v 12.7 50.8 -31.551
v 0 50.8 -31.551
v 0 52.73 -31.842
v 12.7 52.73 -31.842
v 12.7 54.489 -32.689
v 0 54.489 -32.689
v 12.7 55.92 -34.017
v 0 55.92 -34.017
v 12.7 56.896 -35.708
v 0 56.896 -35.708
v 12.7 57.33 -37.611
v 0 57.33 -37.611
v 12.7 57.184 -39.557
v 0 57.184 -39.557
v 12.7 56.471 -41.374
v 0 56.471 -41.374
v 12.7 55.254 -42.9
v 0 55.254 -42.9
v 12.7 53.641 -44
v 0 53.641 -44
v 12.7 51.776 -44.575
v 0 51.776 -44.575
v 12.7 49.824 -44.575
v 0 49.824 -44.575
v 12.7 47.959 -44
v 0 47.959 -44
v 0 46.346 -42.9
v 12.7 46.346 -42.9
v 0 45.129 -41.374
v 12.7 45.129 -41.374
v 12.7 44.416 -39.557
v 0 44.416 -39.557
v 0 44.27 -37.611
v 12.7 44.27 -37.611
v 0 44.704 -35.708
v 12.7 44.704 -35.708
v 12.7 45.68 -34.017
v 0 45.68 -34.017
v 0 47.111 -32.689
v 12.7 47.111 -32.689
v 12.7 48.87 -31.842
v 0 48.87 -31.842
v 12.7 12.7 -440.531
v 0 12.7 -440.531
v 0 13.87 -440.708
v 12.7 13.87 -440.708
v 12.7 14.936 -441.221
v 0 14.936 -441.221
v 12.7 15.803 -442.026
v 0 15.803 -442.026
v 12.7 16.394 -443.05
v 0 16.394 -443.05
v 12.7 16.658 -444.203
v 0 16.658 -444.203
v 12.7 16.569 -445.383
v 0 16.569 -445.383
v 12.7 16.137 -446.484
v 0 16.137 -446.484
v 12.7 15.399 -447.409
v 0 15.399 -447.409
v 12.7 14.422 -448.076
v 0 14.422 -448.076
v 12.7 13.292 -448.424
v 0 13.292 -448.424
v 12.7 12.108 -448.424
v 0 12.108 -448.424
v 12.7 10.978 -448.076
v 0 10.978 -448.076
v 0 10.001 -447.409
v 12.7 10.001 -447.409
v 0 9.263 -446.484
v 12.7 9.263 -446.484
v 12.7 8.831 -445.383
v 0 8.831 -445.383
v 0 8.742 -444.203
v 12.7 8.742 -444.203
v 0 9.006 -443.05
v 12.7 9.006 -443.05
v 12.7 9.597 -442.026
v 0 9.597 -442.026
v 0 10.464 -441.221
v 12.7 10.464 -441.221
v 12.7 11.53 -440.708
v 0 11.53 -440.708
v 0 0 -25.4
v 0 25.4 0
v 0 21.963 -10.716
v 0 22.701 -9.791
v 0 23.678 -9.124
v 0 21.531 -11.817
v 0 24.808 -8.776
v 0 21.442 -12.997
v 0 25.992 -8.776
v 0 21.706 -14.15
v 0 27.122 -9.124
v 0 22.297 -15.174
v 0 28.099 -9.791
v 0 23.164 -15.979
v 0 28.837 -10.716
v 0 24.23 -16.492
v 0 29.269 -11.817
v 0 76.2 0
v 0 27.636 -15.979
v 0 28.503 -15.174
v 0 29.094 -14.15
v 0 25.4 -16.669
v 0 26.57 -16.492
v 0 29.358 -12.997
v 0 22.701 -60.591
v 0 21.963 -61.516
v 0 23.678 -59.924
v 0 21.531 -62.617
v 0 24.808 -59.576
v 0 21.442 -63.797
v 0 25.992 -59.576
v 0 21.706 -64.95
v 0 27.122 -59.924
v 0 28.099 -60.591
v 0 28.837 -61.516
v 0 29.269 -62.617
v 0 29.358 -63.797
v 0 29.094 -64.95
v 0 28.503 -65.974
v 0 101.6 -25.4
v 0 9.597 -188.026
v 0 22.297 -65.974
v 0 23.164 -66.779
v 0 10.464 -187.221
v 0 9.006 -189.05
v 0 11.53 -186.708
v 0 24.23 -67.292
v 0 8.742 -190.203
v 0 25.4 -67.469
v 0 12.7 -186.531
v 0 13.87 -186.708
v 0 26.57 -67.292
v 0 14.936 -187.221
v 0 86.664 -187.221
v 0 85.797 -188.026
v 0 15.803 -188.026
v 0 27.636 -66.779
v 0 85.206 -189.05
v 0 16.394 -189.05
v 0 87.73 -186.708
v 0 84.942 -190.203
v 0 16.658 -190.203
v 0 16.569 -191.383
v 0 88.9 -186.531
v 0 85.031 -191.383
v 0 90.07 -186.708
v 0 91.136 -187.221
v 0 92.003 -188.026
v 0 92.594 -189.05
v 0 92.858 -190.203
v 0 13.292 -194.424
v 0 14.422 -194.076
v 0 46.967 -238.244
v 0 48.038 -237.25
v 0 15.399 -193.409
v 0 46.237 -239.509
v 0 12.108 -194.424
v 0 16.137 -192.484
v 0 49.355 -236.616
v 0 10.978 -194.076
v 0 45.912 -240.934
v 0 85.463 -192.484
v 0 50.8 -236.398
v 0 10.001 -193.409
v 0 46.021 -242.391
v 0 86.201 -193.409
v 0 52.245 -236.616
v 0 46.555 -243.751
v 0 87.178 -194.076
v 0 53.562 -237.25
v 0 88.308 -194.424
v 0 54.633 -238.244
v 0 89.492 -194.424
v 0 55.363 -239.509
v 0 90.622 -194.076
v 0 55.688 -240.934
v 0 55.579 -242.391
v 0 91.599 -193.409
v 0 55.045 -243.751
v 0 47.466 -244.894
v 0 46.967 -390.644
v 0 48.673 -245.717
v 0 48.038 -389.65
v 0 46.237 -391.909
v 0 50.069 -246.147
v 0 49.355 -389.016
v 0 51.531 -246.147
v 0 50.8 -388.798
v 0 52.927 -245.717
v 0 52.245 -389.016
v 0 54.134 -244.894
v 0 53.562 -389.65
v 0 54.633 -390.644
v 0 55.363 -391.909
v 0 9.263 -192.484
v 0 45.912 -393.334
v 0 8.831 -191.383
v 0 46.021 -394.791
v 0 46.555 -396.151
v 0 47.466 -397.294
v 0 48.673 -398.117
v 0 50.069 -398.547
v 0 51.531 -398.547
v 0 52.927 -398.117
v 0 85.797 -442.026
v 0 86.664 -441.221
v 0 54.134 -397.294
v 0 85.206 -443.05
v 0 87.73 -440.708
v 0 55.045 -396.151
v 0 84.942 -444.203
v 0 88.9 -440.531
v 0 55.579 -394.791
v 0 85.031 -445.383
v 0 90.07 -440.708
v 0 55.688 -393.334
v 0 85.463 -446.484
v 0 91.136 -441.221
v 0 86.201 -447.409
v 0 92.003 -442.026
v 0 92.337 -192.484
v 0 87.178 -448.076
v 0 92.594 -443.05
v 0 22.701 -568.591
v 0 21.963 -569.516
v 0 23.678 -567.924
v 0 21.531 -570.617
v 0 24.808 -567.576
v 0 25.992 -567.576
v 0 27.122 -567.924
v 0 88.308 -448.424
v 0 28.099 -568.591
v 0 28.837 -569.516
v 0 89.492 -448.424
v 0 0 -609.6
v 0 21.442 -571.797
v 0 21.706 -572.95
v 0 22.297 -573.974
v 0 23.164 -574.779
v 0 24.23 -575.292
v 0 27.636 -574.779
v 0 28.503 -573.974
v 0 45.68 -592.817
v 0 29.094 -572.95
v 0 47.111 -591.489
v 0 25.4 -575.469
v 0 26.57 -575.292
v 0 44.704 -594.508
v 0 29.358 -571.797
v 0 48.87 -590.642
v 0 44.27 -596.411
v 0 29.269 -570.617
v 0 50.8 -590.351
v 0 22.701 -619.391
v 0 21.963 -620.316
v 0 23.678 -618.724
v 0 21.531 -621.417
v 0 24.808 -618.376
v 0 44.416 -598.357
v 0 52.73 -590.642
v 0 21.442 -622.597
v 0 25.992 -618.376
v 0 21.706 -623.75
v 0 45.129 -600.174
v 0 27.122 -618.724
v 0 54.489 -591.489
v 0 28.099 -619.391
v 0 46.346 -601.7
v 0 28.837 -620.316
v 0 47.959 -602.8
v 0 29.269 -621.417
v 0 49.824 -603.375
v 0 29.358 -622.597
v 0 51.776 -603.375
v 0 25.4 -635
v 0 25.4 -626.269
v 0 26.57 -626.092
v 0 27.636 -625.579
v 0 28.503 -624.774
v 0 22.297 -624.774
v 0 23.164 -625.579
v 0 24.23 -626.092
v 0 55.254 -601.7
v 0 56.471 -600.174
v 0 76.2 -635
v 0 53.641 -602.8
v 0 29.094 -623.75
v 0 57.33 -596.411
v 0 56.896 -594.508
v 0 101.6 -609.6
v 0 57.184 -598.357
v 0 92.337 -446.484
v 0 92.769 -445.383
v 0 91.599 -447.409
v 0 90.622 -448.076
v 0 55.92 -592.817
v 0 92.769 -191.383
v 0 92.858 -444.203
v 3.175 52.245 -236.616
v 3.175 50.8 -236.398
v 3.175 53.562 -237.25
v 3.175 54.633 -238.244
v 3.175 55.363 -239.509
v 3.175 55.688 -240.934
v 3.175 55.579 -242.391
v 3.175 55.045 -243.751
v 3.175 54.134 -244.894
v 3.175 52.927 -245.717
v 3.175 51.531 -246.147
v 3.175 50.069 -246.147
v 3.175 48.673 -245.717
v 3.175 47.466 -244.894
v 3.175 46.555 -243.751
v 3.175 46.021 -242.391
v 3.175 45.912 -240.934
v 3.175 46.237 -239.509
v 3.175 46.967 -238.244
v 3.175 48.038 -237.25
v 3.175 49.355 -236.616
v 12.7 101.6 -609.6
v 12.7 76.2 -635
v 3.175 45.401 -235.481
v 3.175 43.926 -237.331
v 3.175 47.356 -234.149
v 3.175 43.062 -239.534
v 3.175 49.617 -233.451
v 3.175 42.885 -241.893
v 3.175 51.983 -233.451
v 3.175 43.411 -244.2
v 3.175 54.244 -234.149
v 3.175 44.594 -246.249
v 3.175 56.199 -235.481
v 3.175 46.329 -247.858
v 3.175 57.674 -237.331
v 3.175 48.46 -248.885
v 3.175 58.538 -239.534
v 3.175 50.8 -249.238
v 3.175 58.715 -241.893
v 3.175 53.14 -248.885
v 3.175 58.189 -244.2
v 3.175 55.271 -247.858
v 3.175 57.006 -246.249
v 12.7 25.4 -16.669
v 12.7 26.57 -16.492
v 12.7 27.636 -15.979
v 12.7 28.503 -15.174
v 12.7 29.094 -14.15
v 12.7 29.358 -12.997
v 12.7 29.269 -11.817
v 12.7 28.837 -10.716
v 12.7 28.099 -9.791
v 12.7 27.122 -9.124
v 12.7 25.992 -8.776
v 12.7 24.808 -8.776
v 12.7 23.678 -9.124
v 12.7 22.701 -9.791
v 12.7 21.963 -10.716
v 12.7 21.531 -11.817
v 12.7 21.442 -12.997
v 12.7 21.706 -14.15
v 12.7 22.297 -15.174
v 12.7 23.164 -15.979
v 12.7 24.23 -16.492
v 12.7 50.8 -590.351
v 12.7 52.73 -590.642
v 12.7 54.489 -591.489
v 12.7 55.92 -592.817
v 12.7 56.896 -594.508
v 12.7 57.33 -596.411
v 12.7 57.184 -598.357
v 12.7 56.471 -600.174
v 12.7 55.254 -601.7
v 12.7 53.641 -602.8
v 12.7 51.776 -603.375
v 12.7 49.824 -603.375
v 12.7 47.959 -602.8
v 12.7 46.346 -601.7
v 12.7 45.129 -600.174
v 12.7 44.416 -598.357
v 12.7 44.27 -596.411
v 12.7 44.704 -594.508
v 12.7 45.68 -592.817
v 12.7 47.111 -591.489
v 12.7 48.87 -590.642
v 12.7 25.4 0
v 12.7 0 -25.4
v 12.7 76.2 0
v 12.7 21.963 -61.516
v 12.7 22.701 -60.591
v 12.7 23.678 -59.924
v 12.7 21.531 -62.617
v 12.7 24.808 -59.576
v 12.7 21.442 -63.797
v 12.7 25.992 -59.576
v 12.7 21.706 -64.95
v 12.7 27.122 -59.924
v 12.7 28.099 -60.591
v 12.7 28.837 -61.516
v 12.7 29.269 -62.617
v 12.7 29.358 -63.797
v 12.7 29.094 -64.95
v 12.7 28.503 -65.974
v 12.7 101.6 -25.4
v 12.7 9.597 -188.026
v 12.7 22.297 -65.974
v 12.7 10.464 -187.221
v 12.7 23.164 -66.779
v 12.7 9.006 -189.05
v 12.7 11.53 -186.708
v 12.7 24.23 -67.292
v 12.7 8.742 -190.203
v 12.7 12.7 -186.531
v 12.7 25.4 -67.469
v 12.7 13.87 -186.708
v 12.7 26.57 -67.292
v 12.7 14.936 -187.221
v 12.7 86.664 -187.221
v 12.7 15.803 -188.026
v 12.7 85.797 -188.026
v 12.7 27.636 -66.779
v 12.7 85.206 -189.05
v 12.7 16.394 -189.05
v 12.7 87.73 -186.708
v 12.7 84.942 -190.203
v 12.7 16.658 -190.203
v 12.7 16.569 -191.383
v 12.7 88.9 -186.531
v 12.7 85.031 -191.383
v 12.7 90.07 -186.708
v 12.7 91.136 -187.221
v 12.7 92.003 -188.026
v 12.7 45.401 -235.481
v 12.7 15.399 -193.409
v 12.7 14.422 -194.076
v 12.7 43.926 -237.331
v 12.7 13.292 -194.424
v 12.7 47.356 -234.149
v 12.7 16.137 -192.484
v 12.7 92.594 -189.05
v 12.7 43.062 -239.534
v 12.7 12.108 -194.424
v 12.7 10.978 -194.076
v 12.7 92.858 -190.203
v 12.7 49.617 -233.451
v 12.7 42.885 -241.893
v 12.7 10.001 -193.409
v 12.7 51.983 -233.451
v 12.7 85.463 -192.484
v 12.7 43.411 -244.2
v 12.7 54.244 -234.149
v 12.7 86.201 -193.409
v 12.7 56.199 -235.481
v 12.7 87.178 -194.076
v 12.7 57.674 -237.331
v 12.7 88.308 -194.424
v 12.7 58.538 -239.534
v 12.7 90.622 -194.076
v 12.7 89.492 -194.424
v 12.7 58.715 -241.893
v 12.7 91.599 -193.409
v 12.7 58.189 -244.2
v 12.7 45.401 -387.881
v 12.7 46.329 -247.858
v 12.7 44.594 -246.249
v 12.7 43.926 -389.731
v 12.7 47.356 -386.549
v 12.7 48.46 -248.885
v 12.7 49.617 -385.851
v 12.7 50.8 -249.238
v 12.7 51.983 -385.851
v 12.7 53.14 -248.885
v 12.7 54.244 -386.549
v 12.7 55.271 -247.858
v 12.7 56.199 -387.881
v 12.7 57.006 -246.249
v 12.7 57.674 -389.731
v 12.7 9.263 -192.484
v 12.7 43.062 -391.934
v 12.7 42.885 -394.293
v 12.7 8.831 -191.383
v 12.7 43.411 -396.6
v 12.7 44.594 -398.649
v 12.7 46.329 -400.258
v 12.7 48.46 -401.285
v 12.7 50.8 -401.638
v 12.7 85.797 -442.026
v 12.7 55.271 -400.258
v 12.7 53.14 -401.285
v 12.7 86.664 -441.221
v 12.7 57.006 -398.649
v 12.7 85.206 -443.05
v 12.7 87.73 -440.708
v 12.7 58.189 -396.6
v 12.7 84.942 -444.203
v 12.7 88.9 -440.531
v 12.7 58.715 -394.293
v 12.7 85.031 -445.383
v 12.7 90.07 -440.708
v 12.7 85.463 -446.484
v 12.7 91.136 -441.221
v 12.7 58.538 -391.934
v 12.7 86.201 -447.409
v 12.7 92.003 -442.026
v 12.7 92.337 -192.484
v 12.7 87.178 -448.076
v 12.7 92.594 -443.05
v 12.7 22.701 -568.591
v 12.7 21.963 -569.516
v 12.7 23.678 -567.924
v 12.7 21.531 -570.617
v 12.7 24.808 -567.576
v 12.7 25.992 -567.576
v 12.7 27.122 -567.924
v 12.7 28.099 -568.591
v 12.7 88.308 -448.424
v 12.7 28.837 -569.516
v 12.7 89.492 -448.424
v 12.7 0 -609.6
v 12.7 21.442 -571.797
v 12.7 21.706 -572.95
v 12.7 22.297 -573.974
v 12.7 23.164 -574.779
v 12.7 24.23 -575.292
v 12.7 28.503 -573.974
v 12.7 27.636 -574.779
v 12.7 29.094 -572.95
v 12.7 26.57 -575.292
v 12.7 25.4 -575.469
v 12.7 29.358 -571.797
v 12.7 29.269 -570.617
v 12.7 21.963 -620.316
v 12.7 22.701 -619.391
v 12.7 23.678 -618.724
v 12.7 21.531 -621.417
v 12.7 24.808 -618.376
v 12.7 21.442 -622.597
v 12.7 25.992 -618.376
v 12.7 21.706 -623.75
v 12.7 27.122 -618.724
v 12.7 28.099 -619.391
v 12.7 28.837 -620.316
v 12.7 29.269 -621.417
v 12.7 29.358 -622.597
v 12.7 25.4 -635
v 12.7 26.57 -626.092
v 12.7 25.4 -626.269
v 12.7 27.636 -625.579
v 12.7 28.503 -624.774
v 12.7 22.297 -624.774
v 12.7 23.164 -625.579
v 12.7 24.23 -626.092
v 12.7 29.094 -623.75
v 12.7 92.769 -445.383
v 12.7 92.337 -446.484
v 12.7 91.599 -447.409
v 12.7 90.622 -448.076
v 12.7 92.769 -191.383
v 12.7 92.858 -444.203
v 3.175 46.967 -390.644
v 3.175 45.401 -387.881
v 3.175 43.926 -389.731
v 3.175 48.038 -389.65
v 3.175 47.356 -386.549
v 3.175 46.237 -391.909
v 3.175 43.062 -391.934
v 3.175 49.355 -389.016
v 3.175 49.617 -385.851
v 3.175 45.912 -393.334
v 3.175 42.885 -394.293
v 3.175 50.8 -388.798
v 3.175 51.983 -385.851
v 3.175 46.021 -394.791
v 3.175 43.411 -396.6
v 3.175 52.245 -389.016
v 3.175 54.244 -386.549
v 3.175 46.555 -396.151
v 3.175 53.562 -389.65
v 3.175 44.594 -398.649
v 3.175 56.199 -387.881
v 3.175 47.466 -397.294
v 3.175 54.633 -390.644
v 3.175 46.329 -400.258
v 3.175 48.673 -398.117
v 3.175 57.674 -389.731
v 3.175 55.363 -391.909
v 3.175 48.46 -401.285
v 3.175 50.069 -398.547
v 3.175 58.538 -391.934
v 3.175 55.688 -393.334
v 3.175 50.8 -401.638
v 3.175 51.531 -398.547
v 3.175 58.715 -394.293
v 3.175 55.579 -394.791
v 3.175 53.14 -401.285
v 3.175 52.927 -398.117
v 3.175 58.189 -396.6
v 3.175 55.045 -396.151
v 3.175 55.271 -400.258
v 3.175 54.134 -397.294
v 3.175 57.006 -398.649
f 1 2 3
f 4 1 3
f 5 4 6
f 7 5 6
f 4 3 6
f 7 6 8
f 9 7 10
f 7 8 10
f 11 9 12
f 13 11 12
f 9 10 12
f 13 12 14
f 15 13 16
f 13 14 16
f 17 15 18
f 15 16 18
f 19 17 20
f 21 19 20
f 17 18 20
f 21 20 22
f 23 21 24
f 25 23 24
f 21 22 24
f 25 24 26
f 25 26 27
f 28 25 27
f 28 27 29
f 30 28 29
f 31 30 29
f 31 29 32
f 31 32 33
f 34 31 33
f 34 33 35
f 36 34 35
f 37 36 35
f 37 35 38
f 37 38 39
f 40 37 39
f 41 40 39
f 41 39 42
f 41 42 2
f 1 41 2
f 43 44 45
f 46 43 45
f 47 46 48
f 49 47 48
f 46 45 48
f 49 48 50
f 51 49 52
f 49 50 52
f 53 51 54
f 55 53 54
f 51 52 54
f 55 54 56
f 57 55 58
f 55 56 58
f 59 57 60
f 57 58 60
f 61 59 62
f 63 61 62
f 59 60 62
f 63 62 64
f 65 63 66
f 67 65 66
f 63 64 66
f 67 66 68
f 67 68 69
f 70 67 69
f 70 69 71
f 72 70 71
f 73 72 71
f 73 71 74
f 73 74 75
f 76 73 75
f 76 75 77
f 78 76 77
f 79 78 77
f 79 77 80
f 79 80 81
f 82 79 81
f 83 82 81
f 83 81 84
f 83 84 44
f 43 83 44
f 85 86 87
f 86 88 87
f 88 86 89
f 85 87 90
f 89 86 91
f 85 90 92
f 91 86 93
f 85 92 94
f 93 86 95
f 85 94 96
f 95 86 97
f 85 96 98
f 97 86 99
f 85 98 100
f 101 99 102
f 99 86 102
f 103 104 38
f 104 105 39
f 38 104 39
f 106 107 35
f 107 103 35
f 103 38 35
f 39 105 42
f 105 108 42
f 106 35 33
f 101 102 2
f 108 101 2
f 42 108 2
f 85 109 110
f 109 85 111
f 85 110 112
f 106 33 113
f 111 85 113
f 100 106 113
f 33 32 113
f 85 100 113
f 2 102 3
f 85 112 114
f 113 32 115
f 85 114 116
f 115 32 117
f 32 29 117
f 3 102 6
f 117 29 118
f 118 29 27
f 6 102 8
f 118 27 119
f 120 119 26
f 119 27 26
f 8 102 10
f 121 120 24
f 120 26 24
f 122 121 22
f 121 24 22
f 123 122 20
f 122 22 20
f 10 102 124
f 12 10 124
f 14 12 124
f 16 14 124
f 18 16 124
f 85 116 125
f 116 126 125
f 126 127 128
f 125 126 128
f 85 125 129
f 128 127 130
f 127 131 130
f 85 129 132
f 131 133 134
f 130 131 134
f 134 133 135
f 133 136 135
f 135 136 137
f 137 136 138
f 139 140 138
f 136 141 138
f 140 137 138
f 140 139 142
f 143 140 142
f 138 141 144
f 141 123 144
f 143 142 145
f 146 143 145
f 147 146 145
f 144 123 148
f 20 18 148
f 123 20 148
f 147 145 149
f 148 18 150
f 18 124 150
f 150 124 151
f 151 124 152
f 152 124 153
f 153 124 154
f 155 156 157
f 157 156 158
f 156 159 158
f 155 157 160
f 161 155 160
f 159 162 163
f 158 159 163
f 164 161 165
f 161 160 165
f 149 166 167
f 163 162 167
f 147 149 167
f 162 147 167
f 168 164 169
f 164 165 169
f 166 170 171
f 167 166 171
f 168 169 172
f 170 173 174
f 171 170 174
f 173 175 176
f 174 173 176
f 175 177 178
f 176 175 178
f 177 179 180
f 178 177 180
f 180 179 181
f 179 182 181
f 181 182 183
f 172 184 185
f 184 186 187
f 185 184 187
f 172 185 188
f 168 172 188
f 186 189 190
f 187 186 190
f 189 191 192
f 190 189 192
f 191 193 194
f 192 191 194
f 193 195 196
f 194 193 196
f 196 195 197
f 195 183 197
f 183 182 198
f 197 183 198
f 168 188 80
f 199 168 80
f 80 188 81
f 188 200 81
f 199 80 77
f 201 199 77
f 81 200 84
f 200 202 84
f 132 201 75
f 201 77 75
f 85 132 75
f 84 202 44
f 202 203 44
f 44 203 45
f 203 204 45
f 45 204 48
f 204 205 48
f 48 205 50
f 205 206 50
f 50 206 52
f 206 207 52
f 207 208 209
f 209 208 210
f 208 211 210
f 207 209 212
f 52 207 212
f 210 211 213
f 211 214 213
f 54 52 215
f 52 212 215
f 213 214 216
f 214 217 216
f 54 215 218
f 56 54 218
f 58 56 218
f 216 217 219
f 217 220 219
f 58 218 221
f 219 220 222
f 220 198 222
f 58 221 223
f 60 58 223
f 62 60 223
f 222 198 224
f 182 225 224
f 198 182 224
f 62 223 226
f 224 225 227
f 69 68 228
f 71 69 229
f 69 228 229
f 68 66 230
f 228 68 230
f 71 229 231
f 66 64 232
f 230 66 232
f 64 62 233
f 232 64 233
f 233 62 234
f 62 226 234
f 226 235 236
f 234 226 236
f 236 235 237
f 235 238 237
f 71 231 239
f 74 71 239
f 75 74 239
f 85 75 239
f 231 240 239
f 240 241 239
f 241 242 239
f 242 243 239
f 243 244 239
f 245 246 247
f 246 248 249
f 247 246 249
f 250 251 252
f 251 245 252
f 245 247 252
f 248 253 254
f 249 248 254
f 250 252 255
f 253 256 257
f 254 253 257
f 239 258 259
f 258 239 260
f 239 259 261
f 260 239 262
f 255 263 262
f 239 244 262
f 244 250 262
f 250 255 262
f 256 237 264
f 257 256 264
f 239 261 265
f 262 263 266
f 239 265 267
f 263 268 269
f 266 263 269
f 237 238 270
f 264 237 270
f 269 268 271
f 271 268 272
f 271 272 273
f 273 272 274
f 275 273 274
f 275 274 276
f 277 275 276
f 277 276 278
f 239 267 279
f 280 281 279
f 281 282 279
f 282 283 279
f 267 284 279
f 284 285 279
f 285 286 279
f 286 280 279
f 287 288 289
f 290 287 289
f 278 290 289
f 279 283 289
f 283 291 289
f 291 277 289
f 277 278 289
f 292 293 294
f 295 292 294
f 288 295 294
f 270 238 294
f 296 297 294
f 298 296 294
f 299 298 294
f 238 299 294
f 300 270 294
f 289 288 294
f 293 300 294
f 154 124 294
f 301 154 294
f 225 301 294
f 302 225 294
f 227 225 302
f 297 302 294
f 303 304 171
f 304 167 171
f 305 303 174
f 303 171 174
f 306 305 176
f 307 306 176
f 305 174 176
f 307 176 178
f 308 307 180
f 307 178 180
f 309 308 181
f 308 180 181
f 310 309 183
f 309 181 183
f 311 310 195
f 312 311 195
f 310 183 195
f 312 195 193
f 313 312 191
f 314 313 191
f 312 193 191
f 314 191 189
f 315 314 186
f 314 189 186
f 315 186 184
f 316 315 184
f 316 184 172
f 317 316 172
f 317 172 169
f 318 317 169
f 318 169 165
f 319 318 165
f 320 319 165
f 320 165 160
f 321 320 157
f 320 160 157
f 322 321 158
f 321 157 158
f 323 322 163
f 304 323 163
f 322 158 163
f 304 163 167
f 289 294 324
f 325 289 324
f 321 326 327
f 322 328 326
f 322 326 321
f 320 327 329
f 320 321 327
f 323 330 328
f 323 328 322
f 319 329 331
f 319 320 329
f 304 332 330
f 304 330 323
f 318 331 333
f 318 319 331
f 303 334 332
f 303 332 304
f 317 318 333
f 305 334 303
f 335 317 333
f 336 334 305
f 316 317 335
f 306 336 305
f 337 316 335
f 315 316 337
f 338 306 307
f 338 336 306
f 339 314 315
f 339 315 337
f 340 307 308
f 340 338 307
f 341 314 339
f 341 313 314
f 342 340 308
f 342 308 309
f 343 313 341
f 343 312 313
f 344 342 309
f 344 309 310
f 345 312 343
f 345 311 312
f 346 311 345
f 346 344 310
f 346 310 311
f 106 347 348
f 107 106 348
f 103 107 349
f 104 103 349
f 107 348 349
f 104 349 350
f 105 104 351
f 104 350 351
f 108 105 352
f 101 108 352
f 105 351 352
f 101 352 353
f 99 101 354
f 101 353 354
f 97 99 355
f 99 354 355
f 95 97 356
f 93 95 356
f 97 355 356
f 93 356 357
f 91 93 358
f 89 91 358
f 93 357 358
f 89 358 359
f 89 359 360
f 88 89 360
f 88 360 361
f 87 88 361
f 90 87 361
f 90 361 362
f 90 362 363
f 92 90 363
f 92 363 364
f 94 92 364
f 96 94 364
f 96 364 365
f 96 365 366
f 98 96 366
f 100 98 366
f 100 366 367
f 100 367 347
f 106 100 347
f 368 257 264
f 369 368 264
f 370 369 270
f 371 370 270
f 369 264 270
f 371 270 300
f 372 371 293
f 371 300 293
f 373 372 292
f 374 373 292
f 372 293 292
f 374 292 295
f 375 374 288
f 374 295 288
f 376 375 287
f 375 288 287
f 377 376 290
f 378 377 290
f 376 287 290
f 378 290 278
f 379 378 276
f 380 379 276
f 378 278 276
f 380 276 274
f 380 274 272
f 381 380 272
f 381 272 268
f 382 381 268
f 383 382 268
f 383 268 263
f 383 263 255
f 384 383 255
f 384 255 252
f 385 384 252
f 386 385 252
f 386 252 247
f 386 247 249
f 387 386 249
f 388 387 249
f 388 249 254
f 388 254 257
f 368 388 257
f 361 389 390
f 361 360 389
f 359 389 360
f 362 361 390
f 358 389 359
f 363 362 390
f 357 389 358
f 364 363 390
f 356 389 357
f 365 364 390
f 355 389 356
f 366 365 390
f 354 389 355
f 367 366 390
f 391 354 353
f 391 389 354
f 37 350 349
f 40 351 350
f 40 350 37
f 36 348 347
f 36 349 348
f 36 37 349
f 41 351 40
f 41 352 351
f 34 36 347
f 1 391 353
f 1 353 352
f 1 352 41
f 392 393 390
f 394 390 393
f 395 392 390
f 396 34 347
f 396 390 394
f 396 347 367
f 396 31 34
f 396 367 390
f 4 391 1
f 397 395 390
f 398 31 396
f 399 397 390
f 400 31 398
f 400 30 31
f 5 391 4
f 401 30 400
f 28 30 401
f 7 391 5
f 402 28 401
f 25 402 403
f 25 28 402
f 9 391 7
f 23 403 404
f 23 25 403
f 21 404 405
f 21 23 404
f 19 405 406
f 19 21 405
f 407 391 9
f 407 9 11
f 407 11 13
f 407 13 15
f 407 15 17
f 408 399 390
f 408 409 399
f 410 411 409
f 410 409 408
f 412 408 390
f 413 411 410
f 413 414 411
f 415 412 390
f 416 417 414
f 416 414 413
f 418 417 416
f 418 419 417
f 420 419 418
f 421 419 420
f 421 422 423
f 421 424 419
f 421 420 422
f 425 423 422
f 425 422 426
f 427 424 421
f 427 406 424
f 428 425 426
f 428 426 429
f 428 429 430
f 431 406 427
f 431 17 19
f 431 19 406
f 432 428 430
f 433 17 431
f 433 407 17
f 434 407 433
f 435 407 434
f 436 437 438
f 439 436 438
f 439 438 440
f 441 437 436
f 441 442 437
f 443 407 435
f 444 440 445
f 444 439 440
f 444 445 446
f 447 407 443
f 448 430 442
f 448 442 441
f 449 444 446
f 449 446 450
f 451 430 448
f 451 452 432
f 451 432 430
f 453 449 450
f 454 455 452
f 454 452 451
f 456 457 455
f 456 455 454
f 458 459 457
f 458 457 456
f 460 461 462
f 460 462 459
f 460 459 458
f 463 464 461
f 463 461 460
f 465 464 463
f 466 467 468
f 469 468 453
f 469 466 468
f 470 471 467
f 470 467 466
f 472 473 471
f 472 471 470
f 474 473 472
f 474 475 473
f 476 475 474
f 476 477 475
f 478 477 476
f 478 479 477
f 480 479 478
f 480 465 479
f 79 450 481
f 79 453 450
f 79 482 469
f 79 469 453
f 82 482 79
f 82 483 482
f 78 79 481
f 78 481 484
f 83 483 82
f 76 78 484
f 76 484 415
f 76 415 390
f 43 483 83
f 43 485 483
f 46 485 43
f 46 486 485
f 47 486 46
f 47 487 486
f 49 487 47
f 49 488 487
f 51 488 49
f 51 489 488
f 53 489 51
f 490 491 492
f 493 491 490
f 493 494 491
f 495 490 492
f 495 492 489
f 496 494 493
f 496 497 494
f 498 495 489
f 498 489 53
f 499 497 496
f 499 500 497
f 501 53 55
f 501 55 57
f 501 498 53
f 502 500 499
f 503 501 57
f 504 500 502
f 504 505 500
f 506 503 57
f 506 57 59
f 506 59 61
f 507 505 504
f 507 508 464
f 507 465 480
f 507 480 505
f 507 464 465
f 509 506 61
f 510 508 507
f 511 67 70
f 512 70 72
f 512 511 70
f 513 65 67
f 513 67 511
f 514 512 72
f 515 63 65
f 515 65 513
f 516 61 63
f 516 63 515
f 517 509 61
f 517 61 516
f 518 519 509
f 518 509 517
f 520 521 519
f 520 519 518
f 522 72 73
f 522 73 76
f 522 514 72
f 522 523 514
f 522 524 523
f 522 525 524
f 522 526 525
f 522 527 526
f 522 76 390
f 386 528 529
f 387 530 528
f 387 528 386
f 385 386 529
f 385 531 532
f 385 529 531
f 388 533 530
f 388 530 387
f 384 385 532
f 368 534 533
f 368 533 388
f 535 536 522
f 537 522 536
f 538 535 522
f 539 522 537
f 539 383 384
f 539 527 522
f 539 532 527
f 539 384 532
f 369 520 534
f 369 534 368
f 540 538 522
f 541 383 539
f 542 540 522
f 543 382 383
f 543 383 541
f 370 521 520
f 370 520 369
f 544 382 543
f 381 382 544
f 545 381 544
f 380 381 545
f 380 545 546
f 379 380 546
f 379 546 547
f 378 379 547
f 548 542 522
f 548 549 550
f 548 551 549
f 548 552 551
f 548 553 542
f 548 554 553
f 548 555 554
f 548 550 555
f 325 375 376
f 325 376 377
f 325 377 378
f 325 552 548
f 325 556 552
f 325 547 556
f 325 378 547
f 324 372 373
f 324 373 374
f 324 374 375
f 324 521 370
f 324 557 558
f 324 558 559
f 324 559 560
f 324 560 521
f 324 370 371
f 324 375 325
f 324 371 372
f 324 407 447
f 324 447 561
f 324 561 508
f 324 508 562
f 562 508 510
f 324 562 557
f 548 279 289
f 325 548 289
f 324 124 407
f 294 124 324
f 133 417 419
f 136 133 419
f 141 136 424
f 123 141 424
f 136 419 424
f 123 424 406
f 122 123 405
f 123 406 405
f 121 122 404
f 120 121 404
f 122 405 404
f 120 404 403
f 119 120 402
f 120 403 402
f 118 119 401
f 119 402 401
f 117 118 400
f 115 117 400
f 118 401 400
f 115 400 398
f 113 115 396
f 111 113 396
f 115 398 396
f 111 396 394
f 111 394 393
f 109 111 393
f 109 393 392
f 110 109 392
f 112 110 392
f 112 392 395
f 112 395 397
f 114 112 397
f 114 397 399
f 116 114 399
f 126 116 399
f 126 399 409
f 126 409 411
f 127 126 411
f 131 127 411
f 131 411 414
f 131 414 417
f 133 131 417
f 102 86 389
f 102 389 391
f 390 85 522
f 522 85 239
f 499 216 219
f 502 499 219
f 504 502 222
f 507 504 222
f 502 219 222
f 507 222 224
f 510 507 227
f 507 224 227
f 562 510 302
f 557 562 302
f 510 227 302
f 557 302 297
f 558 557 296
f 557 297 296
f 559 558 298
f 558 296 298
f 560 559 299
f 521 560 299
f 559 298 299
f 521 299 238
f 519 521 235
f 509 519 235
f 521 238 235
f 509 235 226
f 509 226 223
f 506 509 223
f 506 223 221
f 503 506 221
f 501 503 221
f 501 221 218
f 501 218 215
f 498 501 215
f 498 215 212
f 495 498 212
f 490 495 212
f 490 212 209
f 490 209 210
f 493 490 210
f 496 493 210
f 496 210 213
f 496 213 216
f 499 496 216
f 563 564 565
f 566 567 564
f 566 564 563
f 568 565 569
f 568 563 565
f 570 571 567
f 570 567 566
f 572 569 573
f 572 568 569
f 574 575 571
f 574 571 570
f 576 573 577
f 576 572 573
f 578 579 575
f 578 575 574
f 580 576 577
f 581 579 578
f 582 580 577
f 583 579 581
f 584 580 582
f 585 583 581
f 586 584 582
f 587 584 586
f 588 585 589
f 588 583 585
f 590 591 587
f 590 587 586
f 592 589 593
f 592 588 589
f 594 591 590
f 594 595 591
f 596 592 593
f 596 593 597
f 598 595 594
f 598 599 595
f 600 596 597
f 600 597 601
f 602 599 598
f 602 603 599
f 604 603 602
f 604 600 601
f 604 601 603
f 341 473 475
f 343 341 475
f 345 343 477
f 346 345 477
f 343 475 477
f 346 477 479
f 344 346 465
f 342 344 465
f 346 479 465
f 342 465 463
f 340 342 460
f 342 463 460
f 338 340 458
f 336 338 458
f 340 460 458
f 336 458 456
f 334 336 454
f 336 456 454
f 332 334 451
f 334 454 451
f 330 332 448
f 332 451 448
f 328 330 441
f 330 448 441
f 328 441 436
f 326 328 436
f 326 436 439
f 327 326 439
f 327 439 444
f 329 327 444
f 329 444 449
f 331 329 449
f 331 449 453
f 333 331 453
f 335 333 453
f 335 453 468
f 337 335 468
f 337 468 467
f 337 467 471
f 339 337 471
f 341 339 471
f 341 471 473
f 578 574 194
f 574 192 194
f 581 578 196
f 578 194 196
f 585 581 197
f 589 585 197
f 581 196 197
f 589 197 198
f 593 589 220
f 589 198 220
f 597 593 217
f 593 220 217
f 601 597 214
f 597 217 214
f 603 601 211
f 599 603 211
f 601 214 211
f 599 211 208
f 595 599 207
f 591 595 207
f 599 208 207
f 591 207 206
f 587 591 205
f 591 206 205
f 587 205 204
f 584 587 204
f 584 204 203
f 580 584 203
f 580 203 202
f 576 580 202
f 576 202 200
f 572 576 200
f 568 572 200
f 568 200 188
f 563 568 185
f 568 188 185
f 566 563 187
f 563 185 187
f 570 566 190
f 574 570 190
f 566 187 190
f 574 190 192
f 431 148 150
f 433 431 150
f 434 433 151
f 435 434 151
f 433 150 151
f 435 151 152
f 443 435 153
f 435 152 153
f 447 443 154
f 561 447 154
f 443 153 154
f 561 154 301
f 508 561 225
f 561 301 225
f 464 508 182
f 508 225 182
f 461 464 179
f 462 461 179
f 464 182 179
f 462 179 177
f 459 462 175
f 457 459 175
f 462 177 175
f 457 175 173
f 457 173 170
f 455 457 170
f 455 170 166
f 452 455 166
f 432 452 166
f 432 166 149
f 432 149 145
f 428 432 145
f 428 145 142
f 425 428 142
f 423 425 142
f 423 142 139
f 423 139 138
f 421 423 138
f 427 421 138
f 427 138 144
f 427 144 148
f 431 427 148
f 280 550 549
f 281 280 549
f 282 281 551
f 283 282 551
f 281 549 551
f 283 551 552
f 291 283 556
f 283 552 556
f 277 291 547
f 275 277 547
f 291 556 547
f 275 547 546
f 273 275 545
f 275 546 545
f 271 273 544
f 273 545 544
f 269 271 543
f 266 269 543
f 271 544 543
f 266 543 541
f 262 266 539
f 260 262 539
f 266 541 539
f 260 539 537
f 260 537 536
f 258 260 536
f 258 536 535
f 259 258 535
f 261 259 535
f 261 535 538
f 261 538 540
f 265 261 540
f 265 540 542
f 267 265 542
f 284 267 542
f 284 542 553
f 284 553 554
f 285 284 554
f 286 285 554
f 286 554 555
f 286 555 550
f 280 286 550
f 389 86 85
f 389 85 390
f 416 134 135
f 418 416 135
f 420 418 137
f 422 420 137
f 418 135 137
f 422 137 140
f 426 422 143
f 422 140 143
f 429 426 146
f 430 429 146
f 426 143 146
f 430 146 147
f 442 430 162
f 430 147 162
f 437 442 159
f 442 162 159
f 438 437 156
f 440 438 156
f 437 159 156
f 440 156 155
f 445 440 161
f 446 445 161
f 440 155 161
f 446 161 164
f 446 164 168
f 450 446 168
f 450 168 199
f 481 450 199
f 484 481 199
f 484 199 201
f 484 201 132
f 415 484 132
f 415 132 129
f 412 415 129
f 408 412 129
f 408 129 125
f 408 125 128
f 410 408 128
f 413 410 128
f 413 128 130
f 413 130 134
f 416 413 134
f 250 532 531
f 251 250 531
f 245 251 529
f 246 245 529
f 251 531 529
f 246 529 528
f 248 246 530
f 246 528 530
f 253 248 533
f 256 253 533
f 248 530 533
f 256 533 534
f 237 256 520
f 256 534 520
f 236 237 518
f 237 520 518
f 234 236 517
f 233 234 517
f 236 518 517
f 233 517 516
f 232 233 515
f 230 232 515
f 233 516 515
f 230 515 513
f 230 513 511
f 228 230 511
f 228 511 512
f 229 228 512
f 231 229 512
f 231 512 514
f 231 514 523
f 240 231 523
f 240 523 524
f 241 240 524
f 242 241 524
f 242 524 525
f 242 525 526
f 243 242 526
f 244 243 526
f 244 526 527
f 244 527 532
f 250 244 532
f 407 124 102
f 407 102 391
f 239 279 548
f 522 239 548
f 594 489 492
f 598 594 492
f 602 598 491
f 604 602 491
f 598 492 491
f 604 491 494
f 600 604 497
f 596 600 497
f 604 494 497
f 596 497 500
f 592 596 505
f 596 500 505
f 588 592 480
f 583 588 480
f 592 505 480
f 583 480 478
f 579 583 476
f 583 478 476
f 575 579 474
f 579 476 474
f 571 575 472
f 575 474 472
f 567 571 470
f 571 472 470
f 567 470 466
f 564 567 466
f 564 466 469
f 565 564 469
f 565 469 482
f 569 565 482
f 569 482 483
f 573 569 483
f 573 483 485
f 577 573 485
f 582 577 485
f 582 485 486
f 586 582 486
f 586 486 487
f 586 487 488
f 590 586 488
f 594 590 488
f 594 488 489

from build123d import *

# Parameters (mm, degrees)
SKETCH1_W                                        = 635
SKETCH1_H                                        = 101.6
BOSS_EXTRUDE1_DEPTH                              = 12.7
F_33_64_0_51563_DIAMETER_HOLE1_D                 = 13.097002
CHAMFER1_SIZE                                    = 25.4
F_3_8_16_TAPPED_HOLE1_D                          = 7.9375
F_3_8_16_TAPPED_HOLE2_D                          = 7.9375
LPATTERN1_COUNT                                  = 2
LPATTERN1_PITCH                                  = 254
LPATTERN1_COUNT_DIR2                             = 2
LPATTERN1_PITCH_DIR2                             = 76.2
CBORE_FOR_3_8_SOCKET_HEAD_CAP_SCREW2_D           = 9.8044
CBORE_FOR_3_8_SOCKET_HEAD_CAP_SCREW2_CBORE_D     = 15.875
CBORE_FOR_3_8_SOCKET_HEAD_CAP_SCREW2_CBORE_DEPTH = 9.525


with BuildPart() as part:
    # Sketch1 → Boss-Extrude1 (new body)
    with BuildSketch(Plane(origin=(0, 0, 0), x_dir=(0, 0, -1), z_dir=(1, 0, 0))):
        with Locations((317.5, 50.8)):
            Rectangle(SKETCH1_W, SKETCH1_H)
    extrude(amount=BOSS_EXTRUDE1_DEPTH)

    # 33/64 (0.51563) Diameter Hole1 (through all)
    with Locations(Plane(origin=(12.7, 0, 0), x_dir=(0, 0, -1), z_dir=(1, 0, 0))):
        with Locations((38.1, 50.8), (596.9, 50.8)):
            Hole(F_33_64_0_51563_DIAMETER_HOLE1_D / 2)

    # Chamfer1
    chamfer1_edges = [part.edges().sort_by_distance(p)[0] for p in [
        (6.35, 101.6, 0),
        (6.35, 101.6, -635),
        (6.35, 0, -635),
        (6.35, 0, 0),
    ]]
    chamfer(chamfer1_edges, length=CHAMFER1_SIZE)

    # 3/8-16 Tapped Hole1 (through all)
    with Locations(Plane.ZY):
        with Locations((-622.3, 25.4), (-571.5, 25.4), (-63.5, 25.4), (-12.7, 25.4)):
            Hole(F_3_8_16_TAPPED_HOLE1_D / 2)

    # 3/8-16 Tapped Hole2 (through all)
    with Locations(Plane(origin=(12.7, 0, 0), x_dir=(0, 0, -1), z_dir=(1, 0, 0))):
        with Locations((190.5, 12.7)):
            f_3_8_16_tapped_hole2 = Hole(F_3_8_16_TAPPED_HOLE2_D / 2)

    # LPattern1: 3_8-16 Tapped Hole2 2 × 2
    with Locations(*[(0, j * LPATTERN1_PITCH_DIR2, -i * LPATTERN1_PITCH) for i in range(LPATTERN1_COUNT) for j in range(LPATTERN1_COUNT_DIR2) if (i, j) != (0, 0)]):
        add(f_3_8_16_tapped_hole2, mode=Mode.SUBTRACT)

    # CBORE for 3/8 Socket Head Cap Screw2 (through all)
    with Locations(Plane(origin=(12.7, 0, 0), x_dir=(0, 0, -1), z_dir=(1, 0, 0))):
        with Locations((241.3, 50.8), (393.7, 50.8)):
            CounterBoreHole(CBORE_FOR_3_8_SOCKET_HEAD_CAP_SCREW2_D / 2, CBORE_FOR_3_8_SOCKET_HEAD_CAP_SCREW2_CBORE_D / 2, CBORE_FOR_3_8_SOCKET_HEAD_CAP_SCREW2_CBORE_DEPTH)


solid = part.part
